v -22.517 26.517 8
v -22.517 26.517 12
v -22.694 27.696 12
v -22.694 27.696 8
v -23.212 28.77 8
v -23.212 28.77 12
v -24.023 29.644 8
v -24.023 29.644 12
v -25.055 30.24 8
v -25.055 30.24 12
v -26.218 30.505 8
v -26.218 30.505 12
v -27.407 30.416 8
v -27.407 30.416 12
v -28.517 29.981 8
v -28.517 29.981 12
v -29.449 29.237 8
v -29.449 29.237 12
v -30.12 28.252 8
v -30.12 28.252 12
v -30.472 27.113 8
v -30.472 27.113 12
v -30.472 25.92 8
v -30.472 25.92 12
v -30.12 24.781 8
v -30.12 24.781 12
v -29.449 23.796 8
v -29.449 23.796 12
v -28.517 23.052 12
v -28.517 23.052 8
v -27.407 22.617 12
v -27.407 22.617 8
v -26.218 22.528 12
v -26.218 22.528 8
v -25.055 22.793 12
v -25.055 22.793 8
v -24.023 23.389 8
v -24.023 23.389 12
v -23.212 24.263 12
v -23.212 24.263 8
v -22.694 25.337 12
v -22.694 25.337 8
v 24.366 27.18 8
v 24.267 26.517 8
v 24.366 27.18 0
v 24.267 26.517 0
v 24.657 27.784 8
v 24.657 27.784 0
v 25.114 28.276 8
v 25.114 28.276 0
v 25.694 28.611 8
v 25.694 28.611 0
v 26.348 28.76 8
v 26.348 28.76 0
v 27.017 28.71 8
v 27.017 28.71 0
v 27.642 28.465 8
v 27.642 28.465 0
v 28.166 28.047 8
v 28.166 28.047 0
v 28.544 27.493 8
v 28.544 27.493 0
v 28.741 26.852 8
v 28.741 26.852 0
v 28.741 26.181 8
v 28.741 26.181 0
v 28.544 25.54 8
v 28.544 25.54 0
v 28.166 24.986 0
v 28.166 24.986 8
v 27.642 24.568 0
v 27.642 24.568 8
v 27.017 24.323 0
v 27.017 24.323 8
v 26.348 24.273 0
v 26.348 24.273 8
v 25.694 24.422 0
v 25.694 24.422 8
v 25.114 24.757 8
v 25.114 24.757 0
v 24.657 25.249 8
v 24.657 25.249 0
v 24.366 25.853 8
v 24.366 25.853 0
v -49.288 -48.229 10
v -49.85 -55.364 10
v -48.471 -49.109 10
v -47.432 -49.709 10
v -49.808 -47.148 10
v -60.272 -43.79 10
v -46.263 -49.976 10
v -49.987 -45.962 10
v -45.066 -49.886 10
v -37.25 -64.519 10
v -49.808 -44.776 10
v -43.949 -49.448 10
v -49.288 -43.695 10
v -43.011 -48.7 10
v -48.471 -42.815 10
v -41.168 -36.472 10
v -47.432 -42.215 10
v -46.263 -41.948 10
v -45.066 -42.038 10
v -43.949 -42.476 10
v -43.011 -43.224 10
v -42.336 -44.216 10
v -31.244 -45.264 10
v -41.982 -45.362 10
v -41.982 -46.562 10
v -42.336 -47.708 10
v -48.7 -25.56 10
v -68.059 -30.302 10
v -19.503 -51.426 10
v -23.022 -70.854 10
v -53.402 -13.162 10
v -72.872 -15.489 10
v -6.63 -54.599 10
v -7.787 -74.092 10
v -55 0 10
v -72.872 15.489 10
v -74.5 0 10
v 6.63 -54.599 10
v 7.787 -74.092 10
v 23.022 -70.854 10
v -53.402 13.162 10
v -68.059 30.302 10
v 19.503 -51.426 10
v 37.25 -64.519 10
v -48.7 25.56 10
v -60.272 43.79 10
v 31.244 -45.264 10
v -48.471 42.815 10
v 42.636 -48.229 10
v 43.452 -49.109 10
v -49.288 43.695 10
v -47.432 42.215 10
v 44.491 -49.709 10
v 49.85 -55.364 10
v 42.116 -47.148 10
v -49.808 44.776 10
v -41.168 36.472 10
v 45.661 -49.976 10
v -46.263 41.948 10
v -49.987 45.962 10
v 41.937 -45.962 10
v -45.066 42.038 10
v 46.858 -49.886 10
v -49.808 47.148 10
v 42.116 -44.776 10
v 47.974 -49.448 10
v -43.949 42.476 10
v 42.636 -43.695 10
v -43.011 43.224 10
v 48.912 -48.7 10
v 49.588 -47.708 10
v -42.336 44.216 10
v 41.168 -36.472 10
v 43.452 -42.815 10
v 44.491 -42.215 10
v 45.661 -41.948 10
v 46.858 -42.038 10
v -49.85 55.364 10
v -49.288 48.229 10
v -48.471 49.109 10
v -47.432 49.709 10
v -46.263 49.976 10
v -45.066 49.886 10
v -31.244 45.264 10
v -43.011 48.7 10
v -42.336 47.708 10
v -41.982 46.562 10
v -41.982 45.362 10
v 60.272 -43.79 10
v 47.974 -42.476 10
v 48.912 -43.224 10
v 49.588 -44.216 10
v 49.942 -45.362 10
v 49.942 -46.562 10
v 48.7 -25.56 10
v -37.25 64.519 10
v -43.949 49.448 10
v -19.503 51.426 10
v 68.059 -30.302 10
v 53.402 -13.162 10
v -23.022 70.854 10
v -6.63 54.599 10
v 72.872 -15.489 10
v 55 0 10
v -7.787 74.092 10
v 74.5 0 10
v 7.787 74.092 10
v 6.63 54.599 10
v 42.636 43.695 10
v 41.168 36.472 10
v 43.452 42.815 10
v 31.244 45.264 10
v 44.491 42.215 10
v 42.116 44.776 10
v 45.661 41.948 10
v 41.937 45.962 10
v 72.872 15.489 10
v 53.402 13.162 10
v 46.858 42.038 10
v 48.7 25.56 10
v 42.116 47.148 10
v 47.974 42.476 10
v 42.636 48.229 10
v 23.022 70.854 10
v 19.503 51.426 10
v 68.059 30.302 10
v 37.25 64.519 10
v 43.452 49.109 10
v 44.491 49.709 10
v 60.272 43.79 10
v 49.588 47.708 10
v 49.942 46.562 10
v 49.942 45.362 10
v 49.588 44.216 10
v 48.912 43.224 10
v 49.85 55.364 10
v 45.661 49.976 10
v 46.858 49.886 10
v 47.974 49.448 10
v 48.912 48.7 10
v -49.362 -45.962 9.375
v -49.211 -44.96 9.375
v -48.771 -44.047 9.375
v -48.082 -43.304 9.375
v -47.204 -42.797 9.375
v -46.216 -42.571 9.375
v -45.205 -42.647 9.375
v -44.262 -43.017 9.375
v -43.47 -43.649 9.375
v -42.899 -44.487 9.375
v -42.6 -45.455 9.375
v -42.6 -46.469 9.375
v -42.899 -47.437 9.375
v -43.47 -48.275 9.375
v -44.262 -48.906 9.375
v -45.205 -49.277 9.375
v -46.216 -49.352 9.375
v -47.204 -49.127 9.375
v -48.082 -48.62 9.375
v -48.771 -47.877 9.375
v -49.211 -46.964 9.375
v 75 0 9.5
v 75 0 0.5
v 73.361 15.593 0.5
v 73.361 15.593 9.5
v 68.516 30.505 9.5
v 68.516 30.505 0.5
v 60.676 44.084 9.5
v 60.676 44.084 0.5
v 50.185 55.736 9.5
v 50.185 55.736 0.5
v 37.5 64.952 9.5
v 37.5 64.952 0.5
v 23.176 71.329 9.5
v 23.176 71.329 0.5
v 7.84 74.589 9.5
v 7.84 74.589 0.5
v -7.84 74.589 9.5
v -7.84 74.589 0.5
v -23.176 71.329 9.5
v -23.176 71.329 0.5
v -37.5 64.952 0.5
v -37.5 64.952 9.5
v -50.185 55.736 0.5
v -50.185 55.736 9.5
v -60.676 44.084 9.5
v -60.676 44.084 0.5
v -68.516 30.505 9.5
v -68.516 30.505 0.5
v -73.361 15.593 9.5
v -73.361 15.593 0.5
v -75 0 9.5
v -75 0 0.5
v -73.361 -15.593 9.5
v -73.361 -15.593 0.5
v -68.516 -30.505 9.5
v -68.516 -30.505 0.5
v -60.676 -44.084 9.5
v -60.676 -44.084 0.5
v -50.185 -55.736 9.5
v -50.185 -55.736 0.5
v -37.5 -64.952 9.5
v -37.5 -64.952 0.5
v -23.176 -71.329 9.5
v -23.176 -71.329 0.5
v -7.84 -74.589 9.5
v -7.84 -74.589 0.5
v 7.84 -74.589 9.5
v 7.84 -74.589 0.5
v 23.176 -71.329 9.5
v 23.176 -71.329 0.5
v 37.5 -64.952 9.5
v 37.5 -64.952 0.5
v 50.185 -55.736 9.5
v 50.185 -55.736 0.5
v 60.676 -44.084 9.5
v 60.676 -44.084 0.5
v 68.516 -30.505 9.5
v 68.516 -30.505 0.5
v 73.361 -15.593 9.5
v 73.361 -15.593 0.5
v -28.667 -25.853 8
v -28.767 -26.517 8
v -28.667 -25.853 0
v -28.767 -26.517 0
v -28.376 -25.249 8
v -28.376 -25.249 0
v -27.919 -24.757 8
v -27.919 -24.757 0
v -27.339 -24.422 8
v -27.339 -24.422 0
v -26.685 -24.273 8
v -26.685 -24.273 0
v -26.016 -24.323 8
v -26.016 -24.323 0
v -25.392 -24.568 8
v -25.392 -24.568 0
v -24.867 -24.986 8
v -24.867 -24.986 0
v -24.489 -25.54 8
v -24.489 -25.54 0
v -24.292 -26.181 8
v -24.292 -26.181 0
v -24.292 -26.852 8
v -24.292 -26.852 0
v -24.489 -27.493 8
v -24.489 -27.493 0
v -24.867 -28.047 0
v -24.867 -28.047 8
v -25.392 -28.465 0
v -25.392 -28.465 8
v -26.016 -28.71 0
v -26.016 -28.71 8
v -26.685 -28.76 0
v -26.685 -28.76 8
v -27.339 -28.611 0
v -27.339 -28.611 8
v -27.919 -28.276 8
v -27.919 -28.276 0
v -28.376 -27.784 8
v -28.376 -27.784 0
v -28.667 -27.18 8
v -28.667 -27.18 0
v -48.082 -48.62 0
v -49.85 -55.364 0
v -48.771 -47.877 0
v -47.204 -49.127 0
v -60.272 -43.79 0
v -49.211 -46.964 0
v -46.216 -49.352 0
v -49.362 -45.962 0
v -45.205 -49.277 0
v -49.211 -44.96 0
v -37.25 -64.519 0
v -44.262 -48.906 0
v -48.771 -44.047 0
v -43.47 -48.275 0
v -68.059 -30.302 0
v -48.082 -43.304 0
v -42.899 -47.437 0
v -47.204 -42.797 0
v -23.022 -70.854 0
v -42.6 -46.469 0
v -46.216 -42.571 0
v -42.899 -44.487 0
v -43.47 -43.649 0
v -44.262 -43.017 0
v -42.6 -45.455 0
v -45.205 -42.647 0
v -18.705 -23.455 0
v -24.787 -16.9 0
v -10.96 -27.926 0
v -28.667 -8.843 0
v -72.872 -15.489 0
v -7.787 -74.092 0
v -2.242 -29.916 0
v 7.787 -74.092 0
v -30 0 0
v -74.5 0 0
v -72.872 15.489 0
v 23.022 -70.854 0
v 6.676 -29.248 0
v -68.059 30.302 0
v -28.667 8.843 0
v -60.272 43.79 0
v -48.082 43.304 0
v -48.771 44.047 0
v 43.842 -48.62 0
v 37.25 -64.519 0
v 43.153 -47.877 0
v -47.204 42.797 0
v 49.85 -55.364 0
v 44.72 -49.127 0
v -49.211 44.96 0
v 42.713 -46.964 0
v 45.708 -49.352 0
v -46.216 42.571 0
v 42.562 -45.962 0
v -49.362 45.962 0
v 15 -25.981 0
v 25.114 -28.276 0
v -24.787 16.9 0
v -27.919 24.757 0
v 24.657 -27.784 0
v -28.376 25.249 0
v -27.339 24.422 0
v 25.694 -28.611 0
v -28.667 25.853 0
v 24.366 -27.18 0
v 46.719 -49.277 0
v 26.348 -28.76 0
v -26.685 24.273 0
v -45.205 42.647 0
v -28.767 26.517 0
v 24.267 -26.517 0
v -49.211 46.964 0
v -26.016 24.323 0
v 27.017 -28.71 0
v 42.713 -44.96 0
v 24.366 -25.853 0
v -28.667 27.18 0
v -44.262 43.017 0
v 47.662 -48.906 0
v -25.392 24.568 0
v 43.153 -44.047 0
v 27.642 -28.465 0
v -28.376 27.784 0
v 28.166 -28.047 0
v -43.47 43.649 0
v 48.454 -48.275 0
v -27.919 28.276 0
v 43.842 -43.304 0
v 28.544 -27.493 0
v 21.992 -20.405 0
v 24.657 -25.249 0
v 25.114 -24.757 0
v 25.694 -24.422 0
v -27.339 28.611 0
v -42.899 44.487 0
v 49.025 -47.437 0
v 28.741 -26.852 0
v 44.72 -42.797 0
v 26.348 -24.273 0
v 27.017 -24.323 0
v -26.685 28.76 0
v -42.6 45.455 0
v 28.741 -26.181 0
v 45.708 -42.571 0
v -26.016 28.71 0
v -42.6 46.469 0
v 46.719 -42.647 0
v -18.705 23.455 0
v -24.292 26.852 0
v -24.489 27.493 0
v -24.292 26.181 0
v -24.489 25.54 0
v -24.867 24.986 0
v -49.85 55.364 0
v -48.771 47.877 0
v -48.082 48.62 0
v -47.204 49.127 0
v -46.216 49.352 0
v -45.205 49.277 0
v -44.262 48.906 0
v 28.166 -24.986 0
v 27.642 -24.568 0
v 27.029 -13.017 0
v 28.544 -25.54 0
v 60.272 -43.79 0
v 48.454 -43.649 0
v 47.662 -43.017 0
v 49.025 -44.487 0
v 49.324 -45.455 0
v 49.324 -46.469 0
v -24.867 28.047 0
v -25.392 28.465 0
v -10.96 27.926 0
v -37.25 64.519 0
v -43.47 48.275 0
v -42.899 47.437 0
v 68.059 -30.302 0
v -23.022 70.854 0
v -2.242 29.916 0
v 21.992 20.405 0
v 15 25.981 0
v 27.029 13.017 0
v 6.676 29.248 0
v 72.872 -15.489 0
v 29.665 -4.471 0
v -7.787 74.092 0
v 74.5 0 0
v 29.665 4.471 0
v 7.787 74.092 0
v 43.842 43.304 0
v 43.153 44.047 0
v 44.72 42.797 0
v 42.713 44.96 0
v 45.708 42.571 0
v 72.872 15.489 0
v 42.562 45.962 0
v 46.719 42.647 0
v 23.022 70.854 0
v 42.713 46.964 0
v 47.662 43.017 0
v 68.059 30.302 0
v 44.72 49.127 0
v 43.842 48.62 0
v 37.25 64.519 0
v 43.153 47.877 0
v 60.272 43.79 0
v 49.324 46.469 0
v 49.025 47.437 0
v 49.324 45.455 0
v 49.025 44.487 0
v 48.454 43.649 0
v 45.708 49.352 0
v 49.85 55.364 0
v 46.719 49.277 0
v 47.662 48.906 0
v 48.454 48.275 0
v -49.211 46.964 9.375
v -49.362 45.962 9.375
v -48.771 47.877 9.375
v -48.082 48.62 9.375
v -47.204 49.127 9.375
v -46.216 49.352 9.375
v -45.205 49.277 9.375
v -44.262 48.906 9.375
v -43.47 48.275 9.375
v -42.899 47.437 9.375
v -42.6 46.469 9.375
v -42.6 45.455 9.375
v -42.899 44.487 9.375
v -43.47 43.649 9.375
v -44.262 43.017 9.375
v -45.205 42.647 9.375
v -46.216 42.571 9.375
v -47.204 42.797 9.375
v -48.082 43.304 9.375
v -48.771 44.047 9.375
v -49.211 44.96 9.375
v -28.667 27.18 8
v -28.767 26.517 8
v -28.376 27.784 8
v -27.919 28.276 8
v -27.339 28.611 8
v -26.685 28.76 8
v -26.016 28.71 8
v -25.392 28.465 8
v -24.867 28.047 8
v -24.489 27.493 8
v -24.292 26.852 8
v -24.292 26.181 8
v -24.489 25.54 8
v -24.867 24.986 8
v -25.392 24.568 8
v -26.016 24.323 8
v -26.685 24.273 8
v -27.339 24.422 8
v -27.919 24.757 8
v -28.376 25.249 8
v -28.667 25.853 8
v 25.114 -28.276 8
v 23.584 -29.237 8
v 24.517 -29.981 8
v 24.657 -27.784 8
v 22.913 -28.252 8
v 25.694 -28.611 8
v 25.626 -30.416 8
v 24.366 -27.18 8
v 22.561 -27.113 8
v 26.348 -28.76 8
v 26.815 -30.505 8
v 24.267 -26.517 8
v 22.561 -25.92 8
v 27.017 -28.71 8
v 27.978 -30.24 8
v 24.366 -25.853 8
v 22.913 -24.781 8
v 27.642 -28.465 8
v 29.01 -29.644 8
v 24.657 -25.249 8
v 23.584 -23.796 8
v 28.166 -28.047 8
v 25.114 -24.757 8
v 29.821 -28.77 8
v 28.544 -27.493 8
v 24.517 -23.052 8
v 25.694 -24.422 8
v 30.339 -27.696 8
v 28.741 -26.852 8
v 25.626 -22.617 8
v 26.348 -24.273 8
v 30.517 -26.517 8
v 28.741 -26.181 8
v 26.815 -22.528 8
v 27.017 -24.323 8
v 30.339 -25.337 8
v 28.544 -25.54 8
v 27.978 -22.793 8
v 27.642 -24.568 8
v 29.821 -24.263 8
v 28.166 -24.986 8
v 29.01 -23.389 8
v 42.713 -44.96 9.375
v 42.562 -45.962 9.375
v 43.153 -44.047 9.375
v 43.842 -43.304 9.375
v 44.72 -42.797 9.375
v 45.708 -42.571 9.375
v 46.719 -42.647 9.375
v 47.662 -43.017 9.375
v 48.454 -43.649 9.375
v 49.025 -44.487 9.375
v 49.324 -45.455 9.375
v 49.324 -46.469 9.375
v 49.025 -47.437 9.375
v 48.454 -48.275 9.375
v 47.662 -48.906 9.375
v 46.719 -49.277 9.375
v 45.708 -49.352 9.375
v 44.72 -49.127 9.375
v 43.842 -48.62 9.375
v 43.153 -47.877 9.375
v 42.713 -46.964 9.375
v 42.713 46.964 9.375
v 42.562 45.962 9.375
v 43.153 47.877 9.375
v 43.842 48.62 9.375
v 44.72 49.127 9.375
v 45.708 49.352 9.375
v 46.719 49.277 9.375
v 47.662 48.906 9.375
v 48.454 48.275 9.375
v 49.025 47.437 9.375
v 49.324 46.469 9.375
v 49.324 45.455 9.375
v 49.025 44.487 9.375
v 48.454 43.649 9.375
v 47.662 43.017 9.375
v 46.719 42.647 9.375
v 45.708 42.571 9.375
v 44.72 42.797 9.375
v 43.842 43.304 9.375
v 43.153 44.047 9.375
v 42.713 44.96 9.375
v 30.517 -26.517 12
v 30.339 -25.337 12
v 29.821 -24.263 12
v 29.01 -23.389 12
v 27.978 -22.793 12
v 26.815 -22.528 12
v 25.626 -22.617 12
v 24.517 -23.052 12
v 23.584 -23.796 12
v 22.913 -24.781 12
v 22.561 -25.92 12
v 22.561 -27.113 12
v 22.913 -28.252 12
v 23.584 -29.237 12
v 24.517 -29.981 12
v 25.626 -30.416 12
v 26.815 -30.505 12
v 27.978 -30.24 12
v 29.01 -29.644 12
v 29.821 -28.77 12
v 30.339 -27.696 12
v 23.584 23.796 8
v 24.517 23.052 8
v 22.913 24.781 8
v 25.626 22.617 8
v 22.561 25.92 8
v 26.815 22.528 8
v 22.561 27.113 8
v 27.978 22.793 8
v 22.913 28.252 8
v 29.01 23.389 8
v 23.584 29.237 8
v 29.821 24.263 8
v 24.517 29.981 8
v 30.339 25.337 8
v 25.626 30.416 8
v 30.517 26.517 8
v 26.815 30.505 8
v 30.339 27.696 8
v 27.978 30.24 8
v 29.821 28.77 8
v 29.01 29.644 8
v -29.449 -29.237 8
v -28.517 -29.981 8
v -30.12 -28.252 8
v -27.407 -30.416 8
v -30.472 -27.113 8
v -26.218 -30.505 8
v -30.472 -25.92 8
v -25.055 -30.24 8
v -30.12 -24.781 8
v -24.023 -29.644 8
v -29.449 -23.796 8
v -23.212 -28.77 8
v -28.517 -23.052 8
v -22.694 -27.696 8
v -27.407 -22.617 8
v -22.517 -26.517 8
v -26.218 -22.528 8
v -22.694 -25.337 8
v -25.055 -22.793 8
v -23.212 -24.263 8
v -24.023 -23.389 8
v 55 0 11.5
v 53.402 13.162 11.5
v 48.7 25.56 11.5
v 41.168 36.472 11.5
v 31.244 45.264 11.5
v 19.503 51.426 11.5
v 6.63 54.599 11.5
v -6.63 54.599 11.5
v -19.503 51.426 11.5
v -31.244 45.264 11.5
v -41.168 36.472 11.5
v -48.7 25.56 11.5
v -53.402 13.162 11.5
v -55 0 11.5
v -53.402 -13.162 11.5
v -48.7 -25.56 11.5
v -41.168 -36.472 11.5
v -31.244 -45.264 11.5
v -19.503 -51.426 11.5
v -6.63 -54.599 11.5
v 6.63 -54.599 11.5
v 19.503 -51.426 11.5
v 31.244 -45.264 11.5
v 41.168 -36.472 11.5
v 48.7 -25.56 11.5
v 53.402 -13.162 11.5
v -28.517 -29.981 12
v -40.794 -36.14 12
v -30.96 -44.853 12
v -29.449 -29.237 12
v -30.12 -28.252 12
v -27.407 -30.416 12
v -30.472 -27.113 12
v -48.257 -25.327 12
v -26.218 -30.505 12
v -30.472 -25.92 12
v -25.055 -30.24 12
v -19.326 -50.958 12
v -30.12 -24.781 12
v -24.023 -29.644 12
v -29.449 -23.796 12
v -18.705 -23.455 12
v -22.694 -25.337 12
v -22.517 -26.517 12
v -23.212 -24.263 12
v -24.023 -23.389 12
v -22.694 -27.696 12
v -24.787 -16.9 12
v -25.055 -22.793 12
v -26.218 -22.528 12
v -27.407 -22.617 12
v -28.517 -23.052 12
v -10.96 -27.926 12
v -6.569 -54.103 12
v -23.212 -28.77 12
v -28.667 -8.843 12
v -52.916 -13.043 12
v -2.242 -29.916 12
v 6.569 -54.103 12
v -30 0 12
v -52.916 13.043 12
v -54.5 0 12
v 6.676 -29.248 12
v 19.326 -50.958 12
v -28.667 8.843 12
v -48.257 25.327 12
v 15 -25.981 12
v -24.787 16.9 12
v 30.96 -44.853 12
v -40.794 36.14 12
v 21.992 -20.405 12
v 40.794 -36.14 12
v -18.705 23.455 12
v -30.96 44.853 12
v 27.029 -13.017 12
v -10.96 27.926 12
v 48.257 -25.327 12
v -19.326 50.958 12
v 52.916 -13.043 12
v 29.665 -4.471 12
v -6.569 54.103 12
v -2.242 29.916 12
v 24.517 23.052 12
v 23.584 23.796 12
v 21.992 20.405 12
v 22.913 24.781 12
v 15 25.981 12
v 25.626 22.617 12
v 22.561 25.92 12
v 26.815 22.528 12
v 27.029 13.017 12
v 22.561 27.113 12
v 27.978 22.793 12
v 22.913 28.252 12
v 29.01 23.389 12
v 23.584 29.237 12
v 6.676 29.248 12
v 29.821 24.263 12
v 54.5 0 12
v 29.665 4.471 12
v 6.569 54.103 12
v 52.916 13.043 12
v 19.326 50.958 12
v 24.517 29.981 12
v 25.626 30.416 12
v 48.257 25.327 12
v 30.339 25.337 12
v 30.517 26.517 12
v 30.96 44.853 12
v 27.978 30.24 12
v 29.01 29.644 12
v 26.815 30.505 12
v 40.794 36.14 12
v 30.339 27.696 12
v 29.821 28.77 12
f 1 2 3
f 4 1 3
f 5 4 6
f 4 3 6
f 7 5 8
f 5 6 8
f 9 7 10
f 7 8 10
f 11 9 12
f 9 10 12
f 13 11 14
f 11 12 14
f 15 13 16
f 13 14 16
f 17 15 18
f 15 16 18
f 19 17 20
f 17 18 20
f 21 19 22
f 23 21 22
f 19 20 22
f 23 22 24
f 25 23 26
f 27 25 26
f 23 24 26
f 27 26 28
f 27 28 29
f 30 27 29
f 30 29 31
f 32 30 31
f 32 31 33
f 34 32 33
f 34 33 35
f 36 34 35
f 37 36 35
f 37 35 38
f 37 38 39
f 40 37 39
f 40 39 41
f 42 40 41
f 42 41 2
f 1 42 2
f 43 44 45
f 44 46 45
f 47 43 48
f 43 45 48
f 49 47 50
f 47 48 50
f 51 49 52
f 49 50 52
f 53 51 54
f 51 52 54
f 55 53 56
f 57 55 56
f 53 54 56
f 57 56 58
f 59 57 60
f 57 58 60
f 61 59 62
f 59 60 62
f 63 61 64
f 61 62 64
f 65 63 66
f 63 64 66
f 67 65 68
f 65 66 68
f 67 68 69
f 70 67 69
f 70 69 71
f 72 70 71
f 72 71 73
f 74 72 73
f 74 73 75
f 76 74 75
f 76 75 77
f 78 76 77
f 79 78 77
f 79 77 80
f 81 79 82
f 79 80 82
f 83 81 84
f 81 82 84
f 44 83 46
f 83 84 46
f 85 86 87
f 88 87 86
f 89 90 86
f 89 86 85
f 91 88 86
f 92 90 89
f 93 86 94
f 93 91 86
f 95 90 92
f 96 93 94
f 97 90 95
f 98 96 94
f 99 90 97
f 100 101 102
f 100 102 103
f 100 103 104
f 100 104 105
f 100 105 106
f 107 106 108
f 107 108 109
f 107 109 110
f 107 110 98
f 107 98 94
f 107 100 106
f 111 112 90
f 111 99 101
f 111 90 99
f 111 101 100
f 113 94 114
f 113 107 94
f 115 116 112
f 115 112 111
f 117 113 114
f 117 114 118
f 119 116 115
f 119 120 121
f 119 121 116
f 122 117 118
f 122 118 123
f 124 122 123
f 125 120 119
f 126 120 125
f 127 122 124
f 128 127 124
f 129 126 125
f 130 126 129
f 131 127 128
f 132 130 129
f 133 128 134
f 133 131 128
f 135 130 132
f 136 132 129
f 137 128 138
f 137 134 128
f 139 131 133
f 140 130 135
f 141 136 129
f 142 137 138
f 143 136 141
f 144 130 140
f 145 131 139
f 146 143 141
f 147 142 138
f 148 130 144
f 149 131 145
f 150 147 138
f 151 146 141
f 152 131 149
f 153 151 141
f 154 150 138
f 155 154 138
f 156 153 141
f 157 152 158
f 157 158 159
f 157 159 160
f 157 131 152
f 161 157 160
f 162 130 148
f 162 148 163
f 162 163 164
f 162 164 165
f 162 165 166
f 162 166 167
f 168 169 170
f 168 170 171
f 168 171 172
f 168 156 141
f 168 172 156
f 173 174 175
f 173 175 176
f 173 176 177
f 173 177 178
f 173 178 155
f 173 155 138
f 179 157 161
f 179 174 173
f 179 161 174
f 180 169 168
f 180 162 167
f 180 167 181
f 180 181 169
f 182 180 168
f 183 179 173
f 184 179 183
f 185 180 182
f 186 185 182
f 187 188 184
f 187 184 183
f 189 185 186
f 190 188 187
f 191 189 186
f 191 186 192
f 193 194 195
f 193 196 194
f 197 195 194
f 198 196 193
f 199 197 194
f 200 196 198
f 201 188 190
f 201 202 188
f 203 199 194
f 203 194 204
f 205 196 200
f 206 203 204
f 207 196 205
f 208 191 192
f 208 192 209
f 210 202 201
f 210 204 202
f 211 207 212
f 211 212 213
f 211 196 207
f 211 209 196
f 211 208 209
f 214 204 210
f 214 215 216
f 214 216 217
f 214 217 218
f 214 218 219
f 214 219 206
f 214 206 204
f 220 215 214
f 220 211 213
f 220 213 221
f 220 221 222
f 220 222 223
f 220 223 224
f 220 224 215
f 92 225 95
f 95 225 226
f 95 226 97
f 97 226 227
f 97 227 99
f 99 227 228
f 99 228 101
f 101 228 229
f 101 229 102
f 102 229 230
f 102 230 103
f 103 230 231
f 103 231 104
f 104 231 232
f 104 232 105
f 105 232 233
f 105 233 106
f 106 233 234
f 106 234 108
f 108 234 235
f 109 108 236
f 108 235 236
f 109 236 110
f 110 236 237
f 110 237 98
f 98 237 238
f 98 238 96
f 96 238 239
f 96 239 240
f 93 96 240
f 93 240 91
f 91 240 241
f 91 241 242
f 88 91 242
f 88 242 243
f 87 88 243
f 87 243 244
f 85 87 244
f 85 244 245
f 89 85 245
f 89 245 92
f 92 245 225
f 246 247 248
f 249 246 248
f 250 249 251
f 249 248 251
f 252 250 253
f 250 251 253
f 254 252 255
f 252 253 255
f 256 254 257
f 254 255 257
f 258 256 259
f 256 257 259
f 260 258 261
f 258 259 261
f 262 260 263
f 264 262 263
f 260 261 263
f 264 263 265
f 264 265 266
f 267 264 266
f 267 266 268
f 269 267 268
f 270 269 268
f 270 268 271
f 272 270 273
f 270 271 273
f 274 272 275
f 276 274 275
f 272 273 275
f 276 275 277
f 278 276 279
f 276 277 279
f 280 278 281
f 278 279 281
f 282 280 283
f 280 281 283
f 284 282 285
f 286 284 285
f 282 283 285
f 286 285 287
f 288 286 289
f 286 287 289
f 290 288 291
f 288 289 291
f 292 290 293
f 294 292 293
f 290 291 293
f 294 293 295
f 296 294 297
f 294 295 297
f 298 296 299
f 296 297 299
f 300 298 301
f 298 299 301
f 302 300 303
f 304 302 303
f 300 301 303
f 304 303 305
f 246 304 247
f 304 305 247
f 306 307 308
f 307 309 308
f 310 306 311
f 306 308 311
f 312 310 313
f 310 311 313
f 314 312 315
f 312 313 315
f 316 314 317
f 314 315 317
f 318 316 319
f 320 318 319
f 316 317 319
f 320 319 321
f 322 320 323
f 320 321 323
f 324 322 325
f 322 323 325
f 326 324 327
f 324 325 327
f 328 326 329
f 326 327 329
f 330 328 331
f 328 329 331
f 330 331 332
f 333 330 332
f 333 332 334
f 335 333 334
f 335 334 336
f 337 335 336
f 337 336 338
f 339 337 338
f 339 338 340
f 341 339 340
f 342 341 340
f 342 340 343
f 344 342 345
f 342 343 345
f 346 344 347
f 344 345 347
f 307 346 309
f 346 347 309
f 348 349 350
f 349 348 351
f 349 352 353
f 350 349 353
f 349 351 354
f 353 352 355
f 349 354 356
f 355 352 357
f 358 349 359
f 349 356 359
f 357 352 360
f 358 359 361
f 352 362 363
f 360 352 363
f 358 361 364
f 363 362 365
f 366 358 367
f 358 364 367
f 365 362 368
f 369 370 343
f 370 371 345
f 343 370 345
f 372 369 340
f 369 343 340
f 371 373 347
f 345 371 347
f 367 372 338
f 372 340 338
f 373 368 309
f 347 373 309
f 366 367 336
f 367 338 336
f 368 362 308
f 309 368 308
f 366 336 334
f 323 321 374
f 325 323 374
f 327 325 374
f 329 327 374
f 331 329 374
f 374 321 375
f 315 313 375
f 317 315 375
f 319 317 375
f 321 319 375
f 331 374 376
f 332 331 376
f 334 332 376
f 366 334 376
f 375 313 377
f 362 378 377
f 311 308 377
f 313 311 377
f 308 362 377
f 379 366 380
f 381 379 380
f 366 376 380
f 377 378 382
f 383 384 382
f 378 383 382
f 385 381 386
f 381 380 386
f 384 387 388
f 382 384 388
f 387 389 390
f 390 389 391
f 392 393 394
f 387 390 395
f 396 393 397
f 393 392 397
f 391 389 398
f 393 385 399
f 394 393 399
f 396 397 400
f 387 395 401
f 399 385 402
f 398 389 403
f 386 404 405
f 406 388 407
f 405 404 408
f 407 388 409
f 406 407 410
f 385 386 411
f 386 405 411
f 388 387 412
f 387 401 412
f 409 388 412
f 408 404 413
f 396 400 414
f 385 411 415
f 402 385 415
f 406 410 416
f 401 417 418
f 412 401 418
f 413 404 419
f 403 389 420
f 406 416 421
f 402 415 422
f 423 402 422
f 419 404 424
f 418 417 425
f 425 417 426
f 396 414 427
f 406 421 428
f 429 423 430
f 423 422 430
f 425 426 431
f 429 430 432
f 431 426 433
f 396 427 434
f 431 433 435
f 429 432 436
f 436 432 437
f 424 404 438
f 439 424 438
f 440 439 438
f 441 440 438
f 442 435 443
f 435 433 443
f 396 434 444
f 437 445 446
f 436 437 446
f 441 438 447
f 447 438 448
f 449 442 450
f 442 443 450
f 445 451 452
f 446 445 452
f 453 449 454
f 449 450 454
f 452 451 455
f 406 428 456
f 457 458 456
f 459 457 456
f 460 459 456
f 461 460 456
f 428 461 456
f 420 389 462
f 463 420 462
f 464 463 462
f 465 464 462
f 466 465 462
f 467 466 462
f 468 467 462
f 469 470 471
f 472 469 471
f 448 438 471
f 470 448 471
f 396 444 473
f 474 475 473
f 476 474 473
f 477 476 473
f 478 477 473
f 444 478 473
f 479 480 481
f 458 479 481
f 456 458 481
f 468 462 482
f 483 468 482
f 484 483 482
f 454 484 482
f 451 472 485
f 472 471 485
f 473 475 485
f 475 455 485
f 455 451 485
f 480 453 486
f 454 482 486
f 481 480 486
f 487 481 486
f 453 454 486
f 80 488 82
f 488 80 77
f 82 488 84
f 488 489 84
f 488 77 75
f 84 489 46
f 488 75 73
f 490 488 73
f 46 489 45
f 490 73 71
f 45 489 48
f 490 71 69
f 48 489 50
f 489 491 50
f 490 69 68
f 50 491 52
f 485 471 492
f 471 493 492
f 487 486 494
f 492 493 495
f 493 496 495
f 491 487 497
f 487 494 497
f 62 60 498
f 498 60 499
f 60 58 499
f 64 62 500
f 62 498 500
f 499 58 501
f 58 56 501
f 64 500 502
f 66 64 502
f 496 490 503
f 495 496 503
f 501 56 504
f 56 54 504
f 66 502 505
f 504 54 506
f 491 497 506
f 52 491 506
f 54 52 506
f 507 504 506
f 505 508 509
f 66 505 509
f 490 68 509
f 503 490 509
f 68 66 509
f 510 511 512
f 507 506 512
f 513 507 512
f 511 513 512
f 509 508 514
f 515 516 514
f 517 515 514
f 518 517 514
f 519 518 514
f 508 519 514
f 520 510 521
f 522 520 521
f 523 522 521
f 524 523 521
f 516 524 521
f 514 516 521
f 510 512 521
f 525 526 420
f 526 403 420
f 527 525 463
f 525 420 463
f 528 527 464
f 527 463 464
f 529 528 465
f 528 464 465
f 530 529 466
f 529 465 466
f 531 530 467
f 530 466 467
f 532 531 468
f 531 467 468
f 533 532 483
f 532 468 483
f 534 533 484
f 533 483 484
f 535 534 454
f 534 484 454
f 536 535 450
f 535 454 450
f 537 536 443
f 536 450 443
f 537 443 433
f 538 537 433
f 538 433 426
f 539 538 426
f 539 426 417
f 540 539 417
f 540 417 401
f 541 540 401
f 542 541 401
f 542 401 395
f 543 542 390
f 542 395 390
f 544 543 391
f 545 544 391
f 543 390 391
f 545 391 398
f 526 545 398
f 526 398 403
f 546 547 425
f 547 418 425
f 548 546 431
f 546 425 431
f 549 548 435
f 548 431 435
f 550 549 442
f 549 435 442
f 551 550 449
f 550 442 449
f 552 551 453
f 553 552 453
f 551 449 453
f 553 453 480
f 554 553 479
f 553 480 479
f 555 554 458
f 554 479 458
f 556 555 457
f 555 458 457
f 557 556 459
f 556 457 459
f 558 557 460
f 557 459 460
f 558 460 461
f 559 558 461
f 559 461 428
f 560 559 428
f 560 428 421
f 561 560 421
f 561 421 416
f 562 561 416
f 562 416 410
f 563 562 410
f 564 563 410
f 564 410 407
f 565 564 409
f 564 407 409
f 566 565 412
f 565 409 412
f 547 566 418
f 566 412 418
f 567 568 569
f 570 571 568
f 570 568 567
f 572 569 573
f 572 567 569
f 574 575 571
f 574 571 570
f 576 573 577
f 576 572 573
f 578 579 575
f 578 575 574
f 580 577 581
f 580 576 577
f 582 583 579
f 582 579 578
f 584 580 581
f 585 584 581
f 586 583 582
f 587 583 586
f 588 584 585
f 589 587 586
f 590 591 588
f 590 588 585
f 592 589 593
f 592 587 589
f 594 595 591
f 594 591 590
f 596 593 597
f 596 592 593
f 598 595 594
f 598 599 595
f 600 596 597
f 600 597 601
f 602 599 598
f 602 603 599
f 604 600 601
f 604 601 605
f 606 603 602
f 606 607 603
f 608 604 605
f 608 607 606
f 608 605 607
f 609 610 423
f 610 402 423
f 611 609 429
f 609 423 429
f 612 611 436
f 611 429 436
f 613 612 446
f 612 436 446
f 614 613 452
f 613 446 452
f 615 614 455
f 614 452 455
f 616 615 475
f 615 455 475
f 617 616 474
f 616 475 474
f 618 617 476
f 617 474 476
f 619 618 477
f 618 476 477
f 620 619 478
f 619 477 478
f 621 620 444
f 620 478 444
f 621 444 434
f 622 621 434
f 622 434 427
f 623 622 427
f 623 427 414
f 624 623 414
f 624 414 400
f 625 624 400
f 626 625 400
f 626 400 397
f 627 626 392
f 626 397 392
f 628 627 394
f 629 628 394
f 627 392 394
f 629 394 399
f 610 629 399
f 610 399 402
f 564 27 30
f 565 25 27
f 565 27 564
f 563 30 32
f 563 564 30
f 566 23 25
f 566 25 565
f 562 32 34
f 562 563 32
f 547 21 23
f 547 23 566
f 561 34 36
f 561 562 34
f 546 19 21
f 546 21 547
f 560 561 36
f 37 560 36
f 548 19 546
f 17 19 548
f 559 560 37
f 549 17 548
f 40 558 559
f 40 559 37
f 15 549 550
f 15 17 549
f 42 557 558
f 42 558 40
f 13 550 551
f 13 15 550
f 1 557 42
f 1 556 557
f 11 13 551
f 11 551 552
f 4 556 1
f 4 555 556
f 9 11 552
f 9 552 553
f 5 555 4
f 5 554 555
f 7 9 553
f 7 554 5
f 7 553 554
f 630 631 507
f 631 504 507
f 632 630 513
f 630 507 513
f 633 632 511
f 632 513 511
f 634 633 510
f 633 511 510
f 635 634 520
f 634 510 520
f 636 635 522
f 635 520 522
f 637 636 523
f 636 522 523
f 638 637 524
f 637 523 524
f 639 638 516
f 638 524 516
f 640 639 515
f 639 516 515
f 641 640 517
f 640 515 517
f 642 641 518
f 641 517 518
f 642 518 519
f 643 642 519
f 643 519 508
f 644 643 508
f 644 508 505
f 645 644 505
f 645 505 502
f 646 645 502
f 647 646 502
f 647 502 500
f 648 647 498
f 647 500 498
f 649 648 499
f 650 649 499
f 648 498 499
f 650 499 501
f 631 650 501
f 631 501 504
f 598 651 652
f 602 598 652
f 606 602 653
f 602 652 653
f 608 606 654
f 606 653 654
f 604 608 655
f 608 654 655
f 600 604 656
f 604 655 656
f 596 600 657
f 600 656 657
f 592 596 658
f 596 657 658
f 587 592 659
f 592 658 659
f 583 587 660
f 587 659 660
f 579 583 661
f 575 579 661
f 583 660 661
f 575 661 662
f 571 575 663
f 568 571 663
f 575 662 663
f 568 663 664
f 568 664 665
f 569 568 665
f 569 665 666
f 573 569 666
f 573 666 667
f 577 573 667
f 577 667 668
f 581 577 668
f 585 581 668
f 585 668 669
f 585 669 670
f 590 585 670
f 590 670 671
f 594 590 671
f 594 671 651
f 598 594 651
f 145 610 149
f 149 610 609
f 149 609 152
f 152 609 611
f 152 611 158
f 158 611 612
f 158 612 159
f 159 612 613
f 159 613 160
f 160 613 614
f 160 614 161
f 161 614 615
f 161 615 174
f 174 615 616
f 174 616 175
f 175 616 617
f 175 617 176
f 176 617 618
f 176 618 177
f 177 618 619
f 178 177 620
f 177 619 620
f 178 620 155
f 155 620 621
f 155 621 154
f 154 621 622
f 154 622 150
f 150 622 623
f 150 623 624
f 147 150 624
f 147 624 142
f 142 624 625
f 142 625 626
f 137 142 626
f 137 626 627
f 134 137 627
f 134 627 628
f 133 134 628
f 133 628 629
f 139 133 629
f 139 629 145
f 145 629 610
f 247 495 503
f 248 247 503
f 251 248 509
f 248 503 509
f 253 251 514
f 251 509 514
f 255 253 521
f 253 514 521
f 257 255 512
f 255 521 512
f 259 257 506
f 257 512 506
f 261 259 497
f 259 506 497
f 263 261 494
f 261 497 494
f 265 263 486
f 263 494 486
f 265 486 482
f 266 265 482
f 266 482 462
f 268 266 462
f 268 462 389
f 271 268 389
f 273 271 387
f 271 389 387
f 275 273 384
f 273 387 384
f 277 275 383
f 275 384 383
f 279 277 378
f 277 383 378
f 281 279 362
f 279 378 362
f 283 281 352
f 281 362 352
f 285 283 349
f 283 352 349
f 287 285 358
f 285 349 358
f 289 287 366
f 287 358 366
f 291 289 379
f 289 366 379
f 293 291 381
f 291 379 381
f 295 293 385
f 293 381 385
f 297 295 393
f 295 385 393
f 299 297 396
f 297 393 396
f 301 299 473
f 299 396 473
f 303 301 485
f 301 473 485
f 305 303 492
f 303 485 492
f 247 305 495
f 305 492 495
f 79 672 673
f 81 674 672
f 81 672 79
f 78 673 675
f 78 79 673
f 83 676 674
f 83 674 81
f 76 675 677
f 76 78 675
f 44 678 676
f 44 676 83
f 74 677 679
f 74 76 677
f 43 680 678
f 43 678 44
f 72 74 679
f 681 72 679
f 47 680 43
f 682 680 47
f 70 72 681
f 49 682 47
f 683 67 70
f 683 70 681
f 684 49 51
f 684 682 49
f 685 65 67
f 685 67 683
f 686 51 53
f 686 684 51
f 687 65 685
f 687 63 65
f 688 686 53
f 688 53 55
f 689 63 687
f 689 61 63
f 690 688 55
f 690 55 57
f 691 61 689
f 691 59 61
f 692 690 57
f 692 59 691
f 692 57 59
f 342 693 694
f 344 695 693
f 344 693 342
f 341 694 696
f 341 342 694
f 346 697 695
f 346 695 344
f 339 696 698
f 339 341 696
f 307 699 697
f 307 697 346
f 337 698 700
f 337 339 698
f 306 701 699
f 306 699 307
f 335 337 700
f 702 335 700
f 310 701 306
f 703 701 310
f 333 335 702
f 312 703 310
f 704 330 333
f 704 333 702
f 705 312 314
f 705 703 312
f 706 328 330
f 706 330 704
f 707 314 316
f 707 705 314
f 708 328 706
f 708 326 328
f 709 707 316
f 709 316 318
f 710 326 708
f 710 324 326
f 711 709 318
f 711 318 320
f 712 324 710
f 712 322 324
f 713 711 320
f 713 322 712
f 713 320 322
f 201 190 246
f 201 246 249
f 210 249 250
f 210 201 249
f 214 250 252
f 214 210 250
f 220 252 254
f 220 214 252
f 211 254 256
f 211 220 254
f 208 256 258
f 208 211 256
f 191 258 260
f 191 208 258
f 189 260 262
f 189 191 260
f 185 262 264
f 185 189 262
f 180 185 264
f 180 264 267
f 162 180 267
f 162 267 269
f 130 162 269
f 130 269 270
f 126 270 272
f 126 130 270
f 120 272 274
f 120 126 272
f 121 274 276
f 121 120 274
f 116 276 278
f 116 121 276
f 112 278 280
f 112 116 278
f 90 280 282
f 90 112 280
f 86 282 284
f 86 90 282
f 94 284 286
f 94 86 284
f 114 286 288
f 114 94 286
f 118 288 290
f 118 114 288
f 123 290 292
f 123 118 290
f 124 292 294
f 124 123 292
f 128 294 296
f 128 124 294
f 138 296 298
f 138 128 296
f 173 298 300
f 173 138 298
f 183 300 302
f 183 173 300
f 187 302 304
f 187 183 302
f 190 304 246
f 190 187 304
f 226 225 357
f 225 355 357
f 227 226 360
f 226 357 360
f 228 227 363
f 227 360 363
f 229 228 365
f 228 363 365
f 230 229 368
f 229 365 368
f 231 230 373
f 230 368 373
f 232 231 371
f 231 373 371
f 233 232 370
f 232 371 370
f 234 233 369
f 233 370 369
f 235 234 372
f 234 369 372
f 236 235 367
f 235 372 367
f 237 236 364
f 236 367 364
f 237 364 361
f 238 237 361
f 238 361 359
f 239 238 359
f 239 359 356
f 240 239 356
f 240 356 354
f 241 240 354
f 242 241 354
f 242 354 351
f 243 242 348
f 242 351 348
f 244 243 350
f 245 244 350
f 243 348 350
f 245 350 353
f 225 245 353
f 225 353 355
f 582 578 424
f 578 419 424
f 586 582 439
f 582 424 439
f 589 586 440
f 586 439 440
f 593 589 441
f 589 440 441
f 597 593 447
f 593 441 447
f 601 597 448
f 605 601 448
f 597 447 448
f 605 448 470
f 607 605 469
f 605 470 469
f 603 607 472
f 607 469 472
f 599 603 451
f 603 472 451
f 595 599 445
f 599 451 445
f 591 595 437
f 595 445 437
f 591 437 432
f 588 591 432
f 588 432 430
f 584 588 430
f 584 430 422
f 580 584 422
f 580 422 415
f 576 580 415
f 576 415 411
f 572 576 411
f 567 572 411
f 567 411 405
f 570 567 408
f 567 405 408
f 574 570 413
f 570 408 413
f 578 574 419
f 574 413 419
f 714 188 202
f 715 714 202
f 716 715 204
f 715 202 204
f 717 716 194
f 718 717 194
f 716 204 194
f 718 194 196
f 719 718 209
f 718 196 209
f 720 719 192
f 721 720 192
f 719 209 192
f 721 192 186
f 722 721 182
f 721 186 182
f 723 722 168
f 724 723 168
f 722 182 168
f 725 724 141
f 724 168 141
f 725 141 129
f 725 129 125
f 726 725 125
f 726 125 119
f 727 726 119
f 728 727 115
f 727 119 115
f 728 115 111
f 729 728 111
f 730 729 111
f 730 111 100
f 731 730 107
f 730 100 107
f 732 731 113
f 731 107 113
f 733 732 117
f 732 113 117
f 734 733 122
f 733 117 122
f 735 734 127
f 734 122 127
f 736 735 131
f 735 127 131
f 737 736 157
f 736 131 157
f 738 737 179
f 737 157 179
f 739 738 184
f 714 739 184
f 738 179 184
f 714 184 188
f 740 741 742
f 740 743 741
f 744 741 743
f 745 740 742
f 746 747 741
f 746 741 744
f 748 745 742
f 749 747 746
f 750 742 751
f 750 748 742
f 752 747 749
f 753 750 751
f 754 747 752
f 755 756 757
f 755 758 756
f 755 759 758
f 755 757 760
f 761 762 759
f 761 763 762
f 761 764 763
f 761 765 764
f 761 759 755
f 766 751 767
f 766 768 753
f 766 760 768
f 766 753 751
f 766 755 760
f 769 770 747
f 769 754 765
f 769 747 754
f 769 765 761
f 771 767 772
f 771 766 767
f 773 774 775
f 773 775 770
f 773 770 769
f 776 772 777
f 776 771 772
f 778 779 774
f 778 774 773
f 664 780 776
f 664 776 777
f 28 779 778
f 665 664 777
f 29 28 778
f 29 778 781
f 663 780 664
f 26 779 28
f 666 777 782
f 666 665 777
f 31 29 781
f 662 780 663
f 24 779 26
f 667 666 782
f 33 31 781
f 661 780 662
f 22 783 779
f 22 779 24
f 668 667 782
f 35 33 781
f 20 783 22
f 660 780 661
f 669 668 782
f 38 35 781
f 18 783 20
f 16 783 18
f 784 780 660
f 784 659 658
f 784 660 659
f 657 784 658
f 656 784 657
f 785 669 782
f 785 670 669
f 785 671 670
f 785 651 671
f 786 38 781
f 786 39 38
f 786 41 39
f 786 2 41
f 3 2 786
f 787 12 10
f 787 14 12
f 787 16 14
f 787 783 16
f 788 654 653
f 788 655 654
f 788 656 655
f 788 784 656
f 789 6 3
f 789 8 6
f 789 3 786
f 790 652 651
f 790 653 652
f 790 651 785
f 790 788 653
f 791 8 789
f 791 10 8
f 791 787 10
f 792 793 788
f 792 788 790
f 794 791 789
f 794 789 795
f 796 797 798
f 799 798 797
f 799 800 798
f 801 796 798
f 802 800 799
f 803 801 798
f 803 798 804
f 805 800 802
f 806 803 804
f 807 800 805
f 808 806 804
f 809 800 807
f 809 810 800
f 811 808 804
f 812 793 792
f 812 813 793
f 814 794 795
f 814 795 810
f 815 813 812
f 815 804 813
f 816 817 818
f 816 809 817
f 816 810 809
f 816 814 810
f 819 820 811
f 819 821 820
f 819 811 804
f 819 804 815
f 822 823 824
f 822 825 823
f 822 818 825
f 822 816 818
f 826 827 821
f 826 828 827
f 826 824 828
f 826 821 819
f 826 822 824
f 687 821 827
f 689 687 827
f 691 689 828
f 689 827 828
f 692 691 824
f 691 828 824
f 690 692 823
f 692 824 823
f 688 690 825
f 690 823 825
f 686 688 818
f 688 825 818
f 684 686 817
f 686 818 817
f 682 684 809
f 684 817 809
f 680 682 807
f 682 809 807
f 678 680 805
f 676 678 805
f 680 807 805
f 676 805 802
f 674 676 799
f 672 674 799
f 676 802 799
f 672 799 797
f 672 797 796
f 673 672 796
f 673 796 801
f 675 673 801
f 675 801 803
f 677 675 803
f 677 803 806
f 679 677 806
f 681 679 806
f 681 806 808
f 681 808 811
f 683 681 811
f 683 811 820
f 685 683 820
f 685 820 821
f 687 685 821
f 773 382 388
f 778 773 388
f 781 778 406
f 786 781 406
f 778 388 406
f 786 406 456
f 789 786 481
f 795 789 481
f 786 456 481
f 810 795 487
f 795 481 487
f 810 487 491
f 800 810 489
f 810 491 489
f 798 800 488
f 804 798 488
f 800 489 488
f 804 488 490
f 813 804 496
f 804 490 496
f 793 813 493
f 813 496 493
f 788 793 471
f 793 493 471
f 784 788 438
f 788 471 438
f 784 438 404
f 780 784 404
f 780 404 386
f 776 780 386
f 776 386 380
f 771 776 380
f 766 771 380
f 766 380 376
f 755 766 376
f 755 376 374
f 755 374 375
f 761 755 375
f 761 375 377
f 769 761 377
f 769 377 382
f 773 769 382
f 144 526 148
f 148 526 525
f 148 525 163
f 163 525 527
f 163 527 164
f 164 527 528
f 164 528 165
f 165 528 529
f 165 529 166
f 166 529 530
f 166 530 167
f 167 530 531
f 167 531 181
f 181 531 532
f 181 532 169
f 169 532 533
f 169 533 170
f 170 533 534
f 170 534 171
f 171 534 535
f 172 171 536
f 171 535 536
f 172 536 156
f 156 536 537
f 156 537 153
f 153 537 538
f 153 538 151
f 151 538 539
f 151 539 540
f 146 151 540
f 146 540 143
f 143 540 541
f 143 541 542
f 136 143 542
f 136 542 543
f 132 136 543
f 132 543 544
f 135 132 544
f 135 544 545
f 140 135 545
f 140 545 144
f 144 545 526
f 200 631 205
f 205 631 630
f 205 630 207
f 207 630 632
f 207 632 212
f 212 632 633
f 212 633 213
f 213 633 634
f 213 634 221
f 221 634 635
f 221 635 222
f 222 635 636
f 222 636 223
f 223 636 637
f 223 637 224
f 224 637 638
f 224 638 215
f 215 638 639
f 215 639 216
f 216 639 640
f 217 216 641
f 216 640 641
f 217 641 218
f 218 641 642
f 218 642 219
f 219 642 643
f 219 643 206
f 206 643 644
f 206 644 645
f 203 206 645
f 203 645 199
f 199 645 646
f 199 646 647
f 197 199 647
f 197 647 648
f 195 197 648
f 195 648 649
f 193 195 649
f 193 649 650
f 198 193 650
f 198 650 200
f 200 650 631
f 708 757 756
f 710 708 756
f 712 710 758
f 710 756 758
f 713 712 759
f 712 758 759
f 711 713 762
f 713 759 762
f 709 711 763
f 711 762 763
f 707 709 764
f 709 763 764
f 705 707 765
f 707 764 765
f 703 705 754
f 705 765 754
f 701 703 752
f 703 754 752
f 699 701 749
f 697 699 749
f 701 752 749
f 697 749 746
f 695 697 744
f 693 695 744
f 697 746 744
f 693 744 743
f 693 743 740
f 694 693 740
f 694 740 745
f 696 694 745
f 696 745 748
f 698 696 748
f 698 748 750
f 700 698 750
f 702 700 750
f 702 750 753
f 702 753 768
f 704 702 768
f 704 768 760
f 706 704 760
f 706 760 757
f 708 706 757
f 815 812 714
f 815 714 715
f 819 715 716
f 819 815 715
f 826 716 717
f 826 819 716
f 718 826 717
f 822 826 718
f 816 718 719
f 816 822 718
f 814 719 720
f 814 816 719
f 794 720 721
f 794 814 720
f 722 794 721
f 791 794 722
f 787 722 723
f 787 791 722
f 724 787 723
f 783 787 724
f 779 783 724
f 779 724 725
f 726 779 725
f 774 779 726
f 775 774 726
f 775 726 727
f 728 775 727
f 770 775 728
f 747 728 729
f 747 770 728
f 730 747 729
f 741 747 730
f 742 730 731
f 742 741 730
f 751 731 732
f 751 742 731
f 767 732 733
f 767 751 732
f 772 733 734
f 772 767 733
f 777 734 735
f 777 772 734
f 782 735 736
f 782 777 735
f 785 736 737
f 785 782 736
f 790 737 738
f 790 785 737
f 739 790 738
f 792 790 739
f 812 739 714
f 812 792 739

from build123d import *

# Parameters (mm, degrees)
SKETCH1_R                        = 75
BOSS_EXTRUDE1_DEPTH              = 10
SKETCH2_R                        = 55
BOSS_EXTRUDE2_DEPTH              = 2
M8X1_25_TAPPED_HOLE1_D           = 6.8
M8X1_25_TAPPED_HOLE1_CSINK_D     = 8.05
M8X1_25_TAPPED_HOLE1_CSINK_ANGLE = 90
CHAMFER1_SIZE                    = 0.5
SKETCH5_R                        = 30
CUT_EXTRUDE1_DEPTH               = 107.742681248
CBORE_FOR_M4_SHCS1_D             = 4.5
CBORE_FOR_M4_SHCS1_CBORE_D       = 8
CBORE_FOR_M4_SHCS1_CBORE_DEPTH   = 4


with BuildPart() as part:
    # Sketch1 → Boss-Extrude1 (new body)
    with BuildSketch(Plane.XY):
        Circle(SKETCH1_R)
    extrude(amount=BOSS_EXTRUDE1_DEPTH)

    # Sketch2 → Boss-Extrude2 (add)
    with BuildSketch(Plane.XY.offset(10)):
        Circle(SKETCH2_R)
    extrude(amount=BOSS_EXTRUDE2_DEPTH)

    # M8x1.25 Tapped Hole1 (through all)
    with Locations(Plane(origin=(-45.961940777, 45.961940777, 10), x_dir=(1, 0, 0), z_dir=(0, 0, 1))):
        with Locations((0, 0), (91.923881554, 0), (0, -91.923881554), (91.923881554, -91.923881554)):
            CounterSinkHole(M8X1_25_TAPPED_HOLE1_D / 2, M8X1_25_TAPPED_HOLE1_CSINK_D / 2, counter_sink_angle=M8X1_25_TAPPED_HOLE1_CSINK_ANGLE)

    # Chamfer1
    chamfer1_edges = [part.edges().sort_by_distance(p)[0] for p in [
        (-75, 0, 0),
        (-75, 0, 10),
        (-55, 0, 12),
    ]]
    chamfer(chamfer1_edges, length=CHAMFER1_SIZE)

    # Sketch5 → Cut-Extrude1 (cut, through all)
    with BuildSketch(Plane(origin=(0, 0, 0), x_dir=(-1, 0, 0), z_dir=(0, 0, -1))):
        Circle(SKETCH5_R)
    extrude(amount=-CUT_EXTRUDE1_DEPTH, mode=Mode.SUBTRACT)

    # CBORE for M4 SHCS1 (through all)
    with Locations(Plane(origin=(-26.516504294, 26.516504294, 12), x_dir=(1, 0, 0), z_dir=(0, 0, 1))):
        with Locations((0, 0), (53.033008588, 0), (0, -53.033008588), (53.033008588, -53.033008588)):
            CounterBoreHole(CBORE_FOR_M4_SHCS1_D / 2, CBORE_FOR_M4_SHCS1_CBORE_D / 2, CBORE_FOR_M4_SHCS1_CBORE_DEPTH)


solid = part.part
